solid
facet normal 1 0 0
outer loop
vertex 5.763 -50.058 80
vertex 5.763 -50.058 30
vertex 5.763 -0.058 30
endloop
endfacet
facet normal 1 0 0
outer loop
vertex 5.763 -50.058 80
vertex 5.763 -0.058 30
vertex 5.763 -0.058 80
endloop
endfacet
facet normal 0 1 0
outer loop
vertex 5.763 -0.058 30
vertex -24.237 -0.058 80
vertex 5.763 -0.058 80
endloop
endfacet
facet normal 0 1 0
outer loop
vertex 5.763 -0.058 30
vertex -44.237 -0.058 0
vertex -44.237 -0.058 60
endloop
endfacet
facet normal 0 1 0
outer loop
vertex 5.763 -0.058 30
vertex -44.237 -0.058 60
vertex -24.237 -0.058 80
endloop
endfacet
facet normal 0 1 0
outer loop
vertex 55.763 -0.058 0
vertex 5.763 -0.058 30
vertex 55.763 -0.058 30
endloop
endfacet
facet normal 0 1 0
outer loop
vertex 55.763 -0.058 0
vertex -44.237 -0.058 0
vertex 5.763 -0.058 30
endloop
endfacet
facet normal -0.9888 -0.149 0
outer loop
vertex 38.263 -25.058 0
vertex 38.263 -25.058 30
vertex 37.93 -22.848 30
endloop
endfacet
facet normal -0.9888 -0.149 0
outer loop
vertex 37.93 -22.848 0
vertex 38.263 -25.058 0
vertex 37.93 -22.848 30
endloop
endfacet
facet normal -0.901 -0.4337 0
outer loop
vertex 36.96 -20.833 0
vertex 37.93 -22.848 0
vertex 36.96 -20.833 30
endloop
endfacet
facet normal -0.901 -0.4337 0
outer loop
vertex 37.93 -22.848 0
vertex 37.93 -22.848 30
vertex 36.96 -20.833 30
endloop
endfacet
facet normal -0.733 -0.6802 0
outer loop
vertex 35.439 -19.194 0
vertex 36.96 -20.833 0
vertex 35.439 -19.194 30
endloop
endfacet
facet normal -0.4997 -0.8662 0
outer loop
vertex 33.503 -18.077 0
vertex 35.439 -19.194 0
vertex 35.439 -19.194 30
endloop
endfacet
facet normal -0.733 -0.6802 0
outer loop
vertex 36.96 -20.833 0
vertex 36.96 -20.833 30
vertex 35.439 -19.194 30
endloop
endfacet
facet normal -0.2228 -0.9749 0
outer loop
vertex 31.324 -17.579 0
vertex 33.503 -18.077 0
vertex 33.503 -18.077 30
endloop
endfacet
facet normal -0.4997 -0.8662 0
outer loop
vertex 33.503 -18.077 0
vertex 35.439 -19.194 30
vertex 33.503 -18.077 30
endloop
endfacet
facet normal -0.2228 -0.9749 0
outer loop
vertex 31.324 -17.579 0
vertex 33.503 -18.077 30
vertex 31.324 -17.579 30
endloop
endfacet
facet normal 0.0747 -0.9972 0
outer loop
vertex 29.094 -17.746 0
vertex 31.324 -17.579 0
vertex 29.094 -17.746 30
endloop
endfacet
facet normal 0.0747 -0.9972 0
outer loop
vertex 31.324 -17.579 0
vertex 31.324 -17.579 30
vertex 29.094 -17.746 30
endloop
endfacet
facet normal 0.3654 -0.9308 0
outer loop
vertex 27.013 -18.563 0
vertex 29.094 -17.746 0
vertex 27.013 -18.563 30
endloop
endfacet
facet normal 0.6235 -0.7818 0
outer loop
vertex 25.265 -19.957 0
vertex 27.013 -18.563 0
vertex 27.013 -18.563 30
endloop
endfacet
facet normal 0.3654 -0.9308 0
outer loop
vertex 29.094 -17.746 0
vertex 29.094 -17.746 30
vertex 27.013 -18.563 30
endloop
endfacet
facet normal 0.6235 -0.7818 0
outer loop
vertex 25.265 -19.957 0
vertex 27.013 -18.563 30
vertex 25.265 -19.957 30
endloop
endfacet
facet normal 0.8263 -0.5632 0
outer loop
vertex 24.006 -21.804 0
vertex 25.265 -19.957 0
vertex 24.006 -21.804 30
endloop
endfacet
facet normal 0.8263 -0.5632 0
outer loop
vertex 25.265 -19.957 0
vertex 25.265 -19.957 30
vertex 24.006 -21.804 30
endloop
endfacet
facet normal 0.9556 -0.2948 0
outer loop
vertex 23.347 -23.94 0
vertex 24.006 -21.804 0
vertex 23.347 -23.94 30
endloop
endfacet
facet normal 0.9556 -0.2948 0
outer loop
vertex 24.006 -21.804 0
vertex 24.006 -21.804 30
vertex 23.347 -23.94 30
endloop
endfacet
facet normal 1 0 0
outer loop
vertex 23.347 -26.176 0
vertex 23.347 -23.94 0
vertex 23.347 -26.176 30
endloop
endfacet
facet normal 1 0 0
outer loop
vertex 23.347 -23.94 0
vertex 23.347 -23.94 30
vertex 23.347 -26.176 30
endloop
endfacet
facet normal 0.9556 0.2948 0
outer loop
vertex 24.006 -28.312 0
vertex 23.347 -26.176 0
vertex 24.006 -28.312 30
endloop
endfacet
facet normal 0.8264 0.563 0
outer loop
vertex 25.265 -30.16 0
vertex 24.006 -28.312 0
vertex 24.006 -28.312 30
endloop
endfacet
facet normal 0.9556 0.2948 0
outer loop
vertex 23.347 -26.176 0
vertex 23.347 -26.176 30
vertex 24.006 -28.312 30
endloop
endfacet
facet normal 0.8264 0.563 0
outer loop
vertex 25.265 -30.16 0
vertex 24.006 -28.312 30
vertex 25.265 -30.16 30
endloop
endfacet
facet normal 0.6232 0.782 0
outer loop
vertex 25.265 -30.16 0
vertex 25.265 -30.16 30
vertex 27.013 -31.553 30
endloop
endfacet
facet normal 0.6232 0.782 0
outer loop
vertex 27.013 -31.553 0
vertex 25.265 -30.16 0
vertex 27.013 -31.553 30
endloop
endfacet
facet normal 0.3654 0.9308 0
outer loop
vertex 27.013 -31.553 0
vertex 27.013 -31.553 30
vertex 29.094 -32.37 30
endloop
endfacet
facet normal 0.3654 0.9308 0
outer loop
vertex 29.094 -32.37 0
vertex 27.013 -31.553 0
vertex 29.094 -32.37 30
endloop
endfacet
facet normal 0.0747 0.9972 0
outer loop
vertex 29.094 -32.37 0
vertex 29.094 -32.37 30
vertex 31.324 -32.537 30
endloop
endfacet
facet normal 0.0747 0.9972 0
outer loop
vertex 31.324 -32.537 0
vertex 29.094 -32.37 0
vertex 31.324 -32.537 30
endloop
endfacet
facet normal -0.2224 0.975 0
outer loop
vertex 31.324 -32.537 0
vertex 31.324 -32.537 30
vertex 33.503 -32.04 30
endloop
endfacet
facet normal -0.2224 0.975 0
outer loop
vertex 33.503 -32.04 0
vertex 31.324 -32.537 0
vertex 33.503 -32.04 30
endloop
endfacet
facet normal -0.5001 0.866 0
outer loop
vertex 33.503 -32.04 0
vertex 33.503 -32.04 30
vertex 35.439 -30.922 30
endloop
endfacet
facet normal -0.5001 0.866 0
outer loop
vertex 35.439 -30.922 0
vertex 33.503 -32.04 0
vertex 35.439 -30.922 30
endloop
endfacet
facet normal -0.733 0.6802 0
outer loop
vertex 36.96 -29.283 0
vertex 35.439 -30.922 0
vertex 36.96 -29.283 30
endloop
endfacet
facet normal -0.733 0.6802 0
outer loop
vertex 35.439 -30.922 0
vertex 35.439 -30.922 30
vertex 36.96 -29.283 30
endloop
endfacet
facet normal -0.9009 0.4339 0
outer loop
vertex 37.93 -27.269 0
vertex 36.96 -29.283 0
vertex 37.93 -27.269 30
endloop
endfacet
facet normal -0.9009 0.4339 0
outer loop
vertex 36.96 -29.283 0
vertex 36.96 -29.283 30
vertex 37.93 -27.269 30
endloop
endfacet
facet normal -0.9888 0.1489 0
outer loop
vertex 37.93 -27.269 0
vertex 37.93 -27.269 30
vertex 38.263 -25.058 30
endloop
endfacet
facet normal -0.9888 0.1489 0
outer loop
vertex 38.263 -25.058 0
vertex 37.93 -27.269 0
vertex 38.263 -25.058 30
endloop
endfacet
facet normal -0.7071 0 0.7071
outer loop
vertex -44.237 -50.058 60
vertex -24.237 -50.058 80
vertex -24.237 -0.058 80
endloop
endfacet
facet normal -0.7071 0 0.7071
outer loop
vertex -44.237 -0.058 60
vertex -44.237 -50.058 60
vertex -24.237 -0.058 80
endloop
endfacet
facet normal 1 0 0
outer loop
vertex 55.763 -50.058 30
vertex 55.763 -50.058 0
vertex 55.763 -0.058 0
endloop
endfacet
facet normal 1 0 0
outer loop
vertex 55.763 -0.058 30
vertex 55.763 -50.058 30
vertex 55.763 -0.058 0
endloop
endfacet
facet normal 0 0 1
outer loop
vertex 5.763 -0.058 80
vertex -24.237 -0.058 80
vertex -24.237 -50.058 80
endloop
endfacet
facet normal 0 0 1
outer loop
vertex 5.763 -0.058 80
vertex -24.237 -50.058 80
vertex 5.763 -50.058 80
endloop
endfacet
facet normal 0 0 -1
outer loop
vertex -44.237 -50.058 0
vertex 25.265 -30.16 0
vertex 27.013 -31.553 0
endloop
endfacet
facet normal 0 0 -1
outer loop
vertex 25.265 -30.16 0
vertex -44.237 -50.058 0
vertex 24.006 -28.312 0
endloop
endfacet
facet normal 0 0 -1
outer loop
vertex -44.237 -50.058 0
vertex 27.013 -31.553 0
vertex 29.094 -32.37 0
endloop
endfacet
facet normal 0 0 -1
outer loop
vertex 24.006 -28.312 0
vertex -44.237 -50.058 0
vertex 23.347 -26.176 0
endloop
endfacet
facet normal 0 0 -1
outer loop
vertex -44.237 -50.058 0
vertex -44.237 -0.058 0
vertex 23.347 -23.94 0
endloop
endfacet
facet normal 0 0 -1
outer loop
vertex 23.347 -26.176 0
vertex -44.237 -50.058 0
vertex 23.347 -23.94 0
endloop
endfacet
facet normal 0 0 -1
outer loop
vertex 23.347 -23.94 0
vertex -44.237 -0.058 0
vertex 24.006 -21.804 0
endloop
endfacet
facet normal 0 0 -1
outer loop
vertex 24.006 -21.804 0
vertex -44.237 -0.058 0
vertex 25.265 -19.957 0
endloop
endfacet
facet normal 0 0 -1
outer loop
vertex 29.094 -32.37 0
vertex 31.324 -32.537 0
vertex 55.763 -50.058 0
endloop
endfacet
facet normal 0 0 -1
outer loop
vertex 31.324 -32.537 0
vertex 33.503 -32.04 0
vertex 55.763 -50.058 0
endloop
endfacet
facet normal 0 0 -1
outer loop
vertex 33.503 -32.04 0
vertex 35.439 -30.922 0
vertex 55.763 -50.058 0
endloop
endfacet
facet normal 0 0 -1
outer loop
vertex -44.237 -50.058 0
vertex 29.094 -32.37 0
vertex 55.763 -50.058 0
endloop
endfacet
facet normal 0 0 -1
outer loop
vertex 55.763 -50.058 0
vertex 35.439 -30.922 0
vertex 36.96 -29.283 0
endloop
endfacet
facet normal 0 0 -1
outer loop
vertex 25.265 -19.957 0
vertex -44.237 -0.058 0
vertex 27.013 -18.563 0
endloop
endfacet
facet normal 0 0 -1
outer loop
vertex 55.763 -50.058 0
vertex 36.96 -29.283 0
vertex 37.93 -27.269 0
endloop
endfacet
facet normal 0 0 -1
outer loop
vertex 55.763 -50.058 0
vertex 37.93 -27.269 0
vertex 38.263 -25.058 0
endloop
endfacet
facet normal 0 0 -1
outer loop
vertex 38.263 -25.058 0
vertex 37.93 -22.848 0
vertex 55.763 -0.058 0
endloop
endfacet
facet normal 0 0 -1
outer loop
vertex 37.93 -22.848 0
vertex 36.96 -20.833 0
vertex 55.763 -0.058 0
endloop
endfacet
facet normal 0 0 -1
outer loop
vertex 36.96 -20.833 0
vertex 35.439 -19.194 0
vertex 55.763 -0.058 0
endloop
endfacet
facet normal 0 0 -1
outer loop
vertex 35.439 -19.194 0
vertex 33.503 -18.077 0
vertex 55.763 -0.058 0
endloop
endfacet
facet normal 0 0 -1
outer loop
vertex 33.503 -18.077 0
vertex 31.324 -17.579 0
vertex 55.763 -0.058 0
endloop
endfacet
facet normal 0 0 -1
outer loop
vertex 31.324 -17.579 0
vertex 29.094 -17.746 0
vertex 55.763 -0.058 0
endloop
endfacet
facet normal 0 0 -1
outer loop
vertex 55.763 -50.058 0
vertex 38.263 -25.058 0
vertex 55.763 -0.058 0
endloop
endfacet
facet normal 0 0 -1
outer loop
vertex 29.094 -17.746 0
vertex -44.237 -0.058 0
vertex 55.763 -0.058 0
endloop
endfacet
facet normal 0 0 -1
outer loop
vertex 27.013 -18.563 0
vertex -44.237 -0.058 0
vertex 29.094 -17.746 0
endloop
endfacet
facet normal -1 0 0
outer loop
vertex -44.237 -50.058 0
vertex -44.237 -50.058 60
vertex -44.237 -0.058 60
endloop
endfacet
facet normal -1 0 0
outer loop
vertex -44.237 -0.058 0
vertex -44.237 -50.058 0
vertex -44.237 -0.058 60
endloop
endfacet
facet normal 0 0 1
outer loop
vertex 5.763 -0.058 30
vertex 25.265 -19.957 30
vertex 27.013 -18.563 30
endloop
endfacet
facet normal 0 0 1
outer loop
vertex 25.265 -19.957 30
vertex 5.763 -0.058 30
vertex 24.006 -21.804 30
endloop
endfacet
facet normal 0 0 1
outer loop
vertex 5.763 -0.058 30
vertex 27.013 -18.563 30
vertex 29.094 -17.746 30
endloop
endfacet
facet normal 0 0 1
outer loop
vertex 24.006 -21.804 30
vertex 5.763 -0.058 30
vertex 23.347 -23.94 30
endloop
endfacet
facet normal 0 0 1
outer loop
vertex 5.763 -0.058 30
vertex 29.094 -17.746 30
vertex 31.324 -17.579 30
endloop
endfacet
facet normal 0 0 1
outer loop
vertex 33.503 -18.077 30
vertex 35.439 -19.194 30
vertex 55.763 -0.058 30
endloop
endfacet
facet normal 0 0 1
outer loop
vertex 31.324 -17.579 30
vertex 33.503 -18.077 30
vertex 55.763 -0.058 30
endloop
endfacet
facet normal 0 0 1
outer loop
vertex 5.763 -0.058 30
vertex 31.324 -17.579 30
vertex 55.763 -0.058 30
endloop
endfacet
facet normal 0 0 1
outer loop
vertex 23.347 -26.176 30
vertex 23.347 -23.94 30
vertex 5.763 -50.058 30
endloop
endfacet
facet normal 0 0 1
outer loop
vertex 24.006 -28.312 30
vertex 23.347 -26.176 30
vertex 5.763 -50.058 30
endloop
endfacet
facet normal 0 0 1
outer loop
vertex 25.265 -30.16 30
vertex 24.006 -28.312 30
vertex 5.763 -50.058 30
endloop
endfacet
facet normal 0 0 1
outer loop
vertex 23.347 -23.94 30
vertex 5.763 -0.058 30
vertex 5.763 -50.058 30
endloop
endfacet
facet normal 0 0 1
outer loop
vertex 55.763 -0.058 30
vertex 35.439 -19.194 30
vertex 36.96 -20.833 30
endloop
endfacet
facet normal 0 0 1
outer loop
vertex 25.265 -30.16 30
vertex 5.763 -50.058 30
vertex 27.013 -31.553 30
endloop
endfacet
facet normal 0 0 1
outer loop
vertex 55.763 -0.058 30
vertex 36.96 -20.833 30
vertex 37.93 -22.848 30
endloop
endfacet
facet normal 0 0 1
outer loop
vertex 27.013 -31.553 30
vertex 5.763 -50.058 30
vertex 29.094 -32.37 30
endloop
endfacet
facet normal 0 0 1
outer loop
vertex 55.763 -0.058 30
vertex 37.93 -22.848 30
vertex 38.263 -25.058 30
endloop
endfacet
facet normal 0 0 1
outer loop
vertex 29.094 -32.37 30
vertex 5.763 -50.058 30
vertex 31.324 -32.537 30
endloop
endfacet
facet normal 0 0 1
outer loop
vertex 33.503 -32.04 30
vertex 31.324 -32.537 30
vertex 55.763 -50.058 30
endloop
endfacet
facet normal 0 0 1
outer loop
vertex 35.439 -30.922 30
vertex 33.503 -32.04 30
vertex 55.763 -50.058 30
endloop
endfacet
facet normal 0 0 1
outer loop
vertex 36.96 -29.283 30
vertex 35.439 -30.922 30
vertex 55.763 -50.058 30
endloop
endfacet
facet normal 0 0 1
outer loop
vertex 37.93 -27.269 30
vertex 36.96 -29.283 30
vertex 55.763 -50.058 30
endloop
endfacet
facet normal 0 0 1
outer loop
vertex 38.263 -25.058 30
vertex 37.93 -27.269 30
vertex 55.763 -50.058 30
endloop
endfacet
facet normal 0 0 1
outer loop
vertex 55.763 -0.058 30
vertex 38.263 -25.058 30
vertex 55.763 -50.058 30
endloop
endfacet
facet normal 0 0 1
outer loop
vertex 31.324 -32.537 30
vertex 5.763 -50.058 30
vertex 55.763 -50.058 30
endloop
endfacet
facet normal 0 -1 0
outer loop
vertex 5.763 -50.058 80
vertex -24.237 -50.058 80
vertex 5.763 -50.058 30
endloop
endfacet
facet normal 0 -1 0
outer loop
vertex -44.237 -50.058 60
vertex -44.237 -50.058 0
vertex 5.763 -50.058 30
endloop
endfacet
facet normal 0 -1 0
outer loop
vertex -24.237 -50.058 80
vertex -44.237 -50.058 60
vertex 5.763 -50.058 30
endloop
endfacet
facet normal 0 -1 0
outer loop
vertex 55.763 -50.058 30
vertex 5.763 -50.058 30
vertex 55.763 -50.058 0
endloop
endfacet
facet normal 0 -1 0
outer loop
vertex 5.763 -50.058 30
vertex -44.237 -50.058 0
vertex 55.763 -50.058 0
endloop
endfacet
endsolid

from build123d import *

# Parameters (mm, degrees)
F0_W     = 100
F0_H     = 50
F1_DEPTH = 80
F2_W     = 50
F2_H     = 50
F3_DEPTH = 50
F4_SIZE  = 20
F5_R     = 7.5
F6_DEPTH = 30


with BuildPart() as f1:
    # F0 (on Top) → F1 (new body)
    with BuildSketch(Plane.XY):
        with Locations((5.763268, -25.05821)):
            Rectangle(F0_W, F0_H)
    extrude(amount=F1_DEPTH)

    # F2 (on face) → F3 (cut, through all)
    with BuildSketch(Plane.XZ.offset(50.05821)):
        with Locations((30.763268, 55)):
            Rectangle(F2_W, F2_H)
    extrude(amount=-F3_DEPTH, mode=Mode.SUBTRACT)

    # F4
    f4_edges = [f1.edges().sort_by_distance(p)[0] for p in [
        (-44.236732, -25.05821, 80),
    ]]
    chamfer(f4_edges, length=F4_SIZE)

    # F5 (on face) → F6 (cut, through all)
    with BuildSketch(Plane.XY.offset(30)):
        with Locations((30.763268, -25.05821)):
            Circle(F5_R)
    extrude(amount=-F6_DEPTH, mode=Mode.SUBTRACT)


solid = f1.part
